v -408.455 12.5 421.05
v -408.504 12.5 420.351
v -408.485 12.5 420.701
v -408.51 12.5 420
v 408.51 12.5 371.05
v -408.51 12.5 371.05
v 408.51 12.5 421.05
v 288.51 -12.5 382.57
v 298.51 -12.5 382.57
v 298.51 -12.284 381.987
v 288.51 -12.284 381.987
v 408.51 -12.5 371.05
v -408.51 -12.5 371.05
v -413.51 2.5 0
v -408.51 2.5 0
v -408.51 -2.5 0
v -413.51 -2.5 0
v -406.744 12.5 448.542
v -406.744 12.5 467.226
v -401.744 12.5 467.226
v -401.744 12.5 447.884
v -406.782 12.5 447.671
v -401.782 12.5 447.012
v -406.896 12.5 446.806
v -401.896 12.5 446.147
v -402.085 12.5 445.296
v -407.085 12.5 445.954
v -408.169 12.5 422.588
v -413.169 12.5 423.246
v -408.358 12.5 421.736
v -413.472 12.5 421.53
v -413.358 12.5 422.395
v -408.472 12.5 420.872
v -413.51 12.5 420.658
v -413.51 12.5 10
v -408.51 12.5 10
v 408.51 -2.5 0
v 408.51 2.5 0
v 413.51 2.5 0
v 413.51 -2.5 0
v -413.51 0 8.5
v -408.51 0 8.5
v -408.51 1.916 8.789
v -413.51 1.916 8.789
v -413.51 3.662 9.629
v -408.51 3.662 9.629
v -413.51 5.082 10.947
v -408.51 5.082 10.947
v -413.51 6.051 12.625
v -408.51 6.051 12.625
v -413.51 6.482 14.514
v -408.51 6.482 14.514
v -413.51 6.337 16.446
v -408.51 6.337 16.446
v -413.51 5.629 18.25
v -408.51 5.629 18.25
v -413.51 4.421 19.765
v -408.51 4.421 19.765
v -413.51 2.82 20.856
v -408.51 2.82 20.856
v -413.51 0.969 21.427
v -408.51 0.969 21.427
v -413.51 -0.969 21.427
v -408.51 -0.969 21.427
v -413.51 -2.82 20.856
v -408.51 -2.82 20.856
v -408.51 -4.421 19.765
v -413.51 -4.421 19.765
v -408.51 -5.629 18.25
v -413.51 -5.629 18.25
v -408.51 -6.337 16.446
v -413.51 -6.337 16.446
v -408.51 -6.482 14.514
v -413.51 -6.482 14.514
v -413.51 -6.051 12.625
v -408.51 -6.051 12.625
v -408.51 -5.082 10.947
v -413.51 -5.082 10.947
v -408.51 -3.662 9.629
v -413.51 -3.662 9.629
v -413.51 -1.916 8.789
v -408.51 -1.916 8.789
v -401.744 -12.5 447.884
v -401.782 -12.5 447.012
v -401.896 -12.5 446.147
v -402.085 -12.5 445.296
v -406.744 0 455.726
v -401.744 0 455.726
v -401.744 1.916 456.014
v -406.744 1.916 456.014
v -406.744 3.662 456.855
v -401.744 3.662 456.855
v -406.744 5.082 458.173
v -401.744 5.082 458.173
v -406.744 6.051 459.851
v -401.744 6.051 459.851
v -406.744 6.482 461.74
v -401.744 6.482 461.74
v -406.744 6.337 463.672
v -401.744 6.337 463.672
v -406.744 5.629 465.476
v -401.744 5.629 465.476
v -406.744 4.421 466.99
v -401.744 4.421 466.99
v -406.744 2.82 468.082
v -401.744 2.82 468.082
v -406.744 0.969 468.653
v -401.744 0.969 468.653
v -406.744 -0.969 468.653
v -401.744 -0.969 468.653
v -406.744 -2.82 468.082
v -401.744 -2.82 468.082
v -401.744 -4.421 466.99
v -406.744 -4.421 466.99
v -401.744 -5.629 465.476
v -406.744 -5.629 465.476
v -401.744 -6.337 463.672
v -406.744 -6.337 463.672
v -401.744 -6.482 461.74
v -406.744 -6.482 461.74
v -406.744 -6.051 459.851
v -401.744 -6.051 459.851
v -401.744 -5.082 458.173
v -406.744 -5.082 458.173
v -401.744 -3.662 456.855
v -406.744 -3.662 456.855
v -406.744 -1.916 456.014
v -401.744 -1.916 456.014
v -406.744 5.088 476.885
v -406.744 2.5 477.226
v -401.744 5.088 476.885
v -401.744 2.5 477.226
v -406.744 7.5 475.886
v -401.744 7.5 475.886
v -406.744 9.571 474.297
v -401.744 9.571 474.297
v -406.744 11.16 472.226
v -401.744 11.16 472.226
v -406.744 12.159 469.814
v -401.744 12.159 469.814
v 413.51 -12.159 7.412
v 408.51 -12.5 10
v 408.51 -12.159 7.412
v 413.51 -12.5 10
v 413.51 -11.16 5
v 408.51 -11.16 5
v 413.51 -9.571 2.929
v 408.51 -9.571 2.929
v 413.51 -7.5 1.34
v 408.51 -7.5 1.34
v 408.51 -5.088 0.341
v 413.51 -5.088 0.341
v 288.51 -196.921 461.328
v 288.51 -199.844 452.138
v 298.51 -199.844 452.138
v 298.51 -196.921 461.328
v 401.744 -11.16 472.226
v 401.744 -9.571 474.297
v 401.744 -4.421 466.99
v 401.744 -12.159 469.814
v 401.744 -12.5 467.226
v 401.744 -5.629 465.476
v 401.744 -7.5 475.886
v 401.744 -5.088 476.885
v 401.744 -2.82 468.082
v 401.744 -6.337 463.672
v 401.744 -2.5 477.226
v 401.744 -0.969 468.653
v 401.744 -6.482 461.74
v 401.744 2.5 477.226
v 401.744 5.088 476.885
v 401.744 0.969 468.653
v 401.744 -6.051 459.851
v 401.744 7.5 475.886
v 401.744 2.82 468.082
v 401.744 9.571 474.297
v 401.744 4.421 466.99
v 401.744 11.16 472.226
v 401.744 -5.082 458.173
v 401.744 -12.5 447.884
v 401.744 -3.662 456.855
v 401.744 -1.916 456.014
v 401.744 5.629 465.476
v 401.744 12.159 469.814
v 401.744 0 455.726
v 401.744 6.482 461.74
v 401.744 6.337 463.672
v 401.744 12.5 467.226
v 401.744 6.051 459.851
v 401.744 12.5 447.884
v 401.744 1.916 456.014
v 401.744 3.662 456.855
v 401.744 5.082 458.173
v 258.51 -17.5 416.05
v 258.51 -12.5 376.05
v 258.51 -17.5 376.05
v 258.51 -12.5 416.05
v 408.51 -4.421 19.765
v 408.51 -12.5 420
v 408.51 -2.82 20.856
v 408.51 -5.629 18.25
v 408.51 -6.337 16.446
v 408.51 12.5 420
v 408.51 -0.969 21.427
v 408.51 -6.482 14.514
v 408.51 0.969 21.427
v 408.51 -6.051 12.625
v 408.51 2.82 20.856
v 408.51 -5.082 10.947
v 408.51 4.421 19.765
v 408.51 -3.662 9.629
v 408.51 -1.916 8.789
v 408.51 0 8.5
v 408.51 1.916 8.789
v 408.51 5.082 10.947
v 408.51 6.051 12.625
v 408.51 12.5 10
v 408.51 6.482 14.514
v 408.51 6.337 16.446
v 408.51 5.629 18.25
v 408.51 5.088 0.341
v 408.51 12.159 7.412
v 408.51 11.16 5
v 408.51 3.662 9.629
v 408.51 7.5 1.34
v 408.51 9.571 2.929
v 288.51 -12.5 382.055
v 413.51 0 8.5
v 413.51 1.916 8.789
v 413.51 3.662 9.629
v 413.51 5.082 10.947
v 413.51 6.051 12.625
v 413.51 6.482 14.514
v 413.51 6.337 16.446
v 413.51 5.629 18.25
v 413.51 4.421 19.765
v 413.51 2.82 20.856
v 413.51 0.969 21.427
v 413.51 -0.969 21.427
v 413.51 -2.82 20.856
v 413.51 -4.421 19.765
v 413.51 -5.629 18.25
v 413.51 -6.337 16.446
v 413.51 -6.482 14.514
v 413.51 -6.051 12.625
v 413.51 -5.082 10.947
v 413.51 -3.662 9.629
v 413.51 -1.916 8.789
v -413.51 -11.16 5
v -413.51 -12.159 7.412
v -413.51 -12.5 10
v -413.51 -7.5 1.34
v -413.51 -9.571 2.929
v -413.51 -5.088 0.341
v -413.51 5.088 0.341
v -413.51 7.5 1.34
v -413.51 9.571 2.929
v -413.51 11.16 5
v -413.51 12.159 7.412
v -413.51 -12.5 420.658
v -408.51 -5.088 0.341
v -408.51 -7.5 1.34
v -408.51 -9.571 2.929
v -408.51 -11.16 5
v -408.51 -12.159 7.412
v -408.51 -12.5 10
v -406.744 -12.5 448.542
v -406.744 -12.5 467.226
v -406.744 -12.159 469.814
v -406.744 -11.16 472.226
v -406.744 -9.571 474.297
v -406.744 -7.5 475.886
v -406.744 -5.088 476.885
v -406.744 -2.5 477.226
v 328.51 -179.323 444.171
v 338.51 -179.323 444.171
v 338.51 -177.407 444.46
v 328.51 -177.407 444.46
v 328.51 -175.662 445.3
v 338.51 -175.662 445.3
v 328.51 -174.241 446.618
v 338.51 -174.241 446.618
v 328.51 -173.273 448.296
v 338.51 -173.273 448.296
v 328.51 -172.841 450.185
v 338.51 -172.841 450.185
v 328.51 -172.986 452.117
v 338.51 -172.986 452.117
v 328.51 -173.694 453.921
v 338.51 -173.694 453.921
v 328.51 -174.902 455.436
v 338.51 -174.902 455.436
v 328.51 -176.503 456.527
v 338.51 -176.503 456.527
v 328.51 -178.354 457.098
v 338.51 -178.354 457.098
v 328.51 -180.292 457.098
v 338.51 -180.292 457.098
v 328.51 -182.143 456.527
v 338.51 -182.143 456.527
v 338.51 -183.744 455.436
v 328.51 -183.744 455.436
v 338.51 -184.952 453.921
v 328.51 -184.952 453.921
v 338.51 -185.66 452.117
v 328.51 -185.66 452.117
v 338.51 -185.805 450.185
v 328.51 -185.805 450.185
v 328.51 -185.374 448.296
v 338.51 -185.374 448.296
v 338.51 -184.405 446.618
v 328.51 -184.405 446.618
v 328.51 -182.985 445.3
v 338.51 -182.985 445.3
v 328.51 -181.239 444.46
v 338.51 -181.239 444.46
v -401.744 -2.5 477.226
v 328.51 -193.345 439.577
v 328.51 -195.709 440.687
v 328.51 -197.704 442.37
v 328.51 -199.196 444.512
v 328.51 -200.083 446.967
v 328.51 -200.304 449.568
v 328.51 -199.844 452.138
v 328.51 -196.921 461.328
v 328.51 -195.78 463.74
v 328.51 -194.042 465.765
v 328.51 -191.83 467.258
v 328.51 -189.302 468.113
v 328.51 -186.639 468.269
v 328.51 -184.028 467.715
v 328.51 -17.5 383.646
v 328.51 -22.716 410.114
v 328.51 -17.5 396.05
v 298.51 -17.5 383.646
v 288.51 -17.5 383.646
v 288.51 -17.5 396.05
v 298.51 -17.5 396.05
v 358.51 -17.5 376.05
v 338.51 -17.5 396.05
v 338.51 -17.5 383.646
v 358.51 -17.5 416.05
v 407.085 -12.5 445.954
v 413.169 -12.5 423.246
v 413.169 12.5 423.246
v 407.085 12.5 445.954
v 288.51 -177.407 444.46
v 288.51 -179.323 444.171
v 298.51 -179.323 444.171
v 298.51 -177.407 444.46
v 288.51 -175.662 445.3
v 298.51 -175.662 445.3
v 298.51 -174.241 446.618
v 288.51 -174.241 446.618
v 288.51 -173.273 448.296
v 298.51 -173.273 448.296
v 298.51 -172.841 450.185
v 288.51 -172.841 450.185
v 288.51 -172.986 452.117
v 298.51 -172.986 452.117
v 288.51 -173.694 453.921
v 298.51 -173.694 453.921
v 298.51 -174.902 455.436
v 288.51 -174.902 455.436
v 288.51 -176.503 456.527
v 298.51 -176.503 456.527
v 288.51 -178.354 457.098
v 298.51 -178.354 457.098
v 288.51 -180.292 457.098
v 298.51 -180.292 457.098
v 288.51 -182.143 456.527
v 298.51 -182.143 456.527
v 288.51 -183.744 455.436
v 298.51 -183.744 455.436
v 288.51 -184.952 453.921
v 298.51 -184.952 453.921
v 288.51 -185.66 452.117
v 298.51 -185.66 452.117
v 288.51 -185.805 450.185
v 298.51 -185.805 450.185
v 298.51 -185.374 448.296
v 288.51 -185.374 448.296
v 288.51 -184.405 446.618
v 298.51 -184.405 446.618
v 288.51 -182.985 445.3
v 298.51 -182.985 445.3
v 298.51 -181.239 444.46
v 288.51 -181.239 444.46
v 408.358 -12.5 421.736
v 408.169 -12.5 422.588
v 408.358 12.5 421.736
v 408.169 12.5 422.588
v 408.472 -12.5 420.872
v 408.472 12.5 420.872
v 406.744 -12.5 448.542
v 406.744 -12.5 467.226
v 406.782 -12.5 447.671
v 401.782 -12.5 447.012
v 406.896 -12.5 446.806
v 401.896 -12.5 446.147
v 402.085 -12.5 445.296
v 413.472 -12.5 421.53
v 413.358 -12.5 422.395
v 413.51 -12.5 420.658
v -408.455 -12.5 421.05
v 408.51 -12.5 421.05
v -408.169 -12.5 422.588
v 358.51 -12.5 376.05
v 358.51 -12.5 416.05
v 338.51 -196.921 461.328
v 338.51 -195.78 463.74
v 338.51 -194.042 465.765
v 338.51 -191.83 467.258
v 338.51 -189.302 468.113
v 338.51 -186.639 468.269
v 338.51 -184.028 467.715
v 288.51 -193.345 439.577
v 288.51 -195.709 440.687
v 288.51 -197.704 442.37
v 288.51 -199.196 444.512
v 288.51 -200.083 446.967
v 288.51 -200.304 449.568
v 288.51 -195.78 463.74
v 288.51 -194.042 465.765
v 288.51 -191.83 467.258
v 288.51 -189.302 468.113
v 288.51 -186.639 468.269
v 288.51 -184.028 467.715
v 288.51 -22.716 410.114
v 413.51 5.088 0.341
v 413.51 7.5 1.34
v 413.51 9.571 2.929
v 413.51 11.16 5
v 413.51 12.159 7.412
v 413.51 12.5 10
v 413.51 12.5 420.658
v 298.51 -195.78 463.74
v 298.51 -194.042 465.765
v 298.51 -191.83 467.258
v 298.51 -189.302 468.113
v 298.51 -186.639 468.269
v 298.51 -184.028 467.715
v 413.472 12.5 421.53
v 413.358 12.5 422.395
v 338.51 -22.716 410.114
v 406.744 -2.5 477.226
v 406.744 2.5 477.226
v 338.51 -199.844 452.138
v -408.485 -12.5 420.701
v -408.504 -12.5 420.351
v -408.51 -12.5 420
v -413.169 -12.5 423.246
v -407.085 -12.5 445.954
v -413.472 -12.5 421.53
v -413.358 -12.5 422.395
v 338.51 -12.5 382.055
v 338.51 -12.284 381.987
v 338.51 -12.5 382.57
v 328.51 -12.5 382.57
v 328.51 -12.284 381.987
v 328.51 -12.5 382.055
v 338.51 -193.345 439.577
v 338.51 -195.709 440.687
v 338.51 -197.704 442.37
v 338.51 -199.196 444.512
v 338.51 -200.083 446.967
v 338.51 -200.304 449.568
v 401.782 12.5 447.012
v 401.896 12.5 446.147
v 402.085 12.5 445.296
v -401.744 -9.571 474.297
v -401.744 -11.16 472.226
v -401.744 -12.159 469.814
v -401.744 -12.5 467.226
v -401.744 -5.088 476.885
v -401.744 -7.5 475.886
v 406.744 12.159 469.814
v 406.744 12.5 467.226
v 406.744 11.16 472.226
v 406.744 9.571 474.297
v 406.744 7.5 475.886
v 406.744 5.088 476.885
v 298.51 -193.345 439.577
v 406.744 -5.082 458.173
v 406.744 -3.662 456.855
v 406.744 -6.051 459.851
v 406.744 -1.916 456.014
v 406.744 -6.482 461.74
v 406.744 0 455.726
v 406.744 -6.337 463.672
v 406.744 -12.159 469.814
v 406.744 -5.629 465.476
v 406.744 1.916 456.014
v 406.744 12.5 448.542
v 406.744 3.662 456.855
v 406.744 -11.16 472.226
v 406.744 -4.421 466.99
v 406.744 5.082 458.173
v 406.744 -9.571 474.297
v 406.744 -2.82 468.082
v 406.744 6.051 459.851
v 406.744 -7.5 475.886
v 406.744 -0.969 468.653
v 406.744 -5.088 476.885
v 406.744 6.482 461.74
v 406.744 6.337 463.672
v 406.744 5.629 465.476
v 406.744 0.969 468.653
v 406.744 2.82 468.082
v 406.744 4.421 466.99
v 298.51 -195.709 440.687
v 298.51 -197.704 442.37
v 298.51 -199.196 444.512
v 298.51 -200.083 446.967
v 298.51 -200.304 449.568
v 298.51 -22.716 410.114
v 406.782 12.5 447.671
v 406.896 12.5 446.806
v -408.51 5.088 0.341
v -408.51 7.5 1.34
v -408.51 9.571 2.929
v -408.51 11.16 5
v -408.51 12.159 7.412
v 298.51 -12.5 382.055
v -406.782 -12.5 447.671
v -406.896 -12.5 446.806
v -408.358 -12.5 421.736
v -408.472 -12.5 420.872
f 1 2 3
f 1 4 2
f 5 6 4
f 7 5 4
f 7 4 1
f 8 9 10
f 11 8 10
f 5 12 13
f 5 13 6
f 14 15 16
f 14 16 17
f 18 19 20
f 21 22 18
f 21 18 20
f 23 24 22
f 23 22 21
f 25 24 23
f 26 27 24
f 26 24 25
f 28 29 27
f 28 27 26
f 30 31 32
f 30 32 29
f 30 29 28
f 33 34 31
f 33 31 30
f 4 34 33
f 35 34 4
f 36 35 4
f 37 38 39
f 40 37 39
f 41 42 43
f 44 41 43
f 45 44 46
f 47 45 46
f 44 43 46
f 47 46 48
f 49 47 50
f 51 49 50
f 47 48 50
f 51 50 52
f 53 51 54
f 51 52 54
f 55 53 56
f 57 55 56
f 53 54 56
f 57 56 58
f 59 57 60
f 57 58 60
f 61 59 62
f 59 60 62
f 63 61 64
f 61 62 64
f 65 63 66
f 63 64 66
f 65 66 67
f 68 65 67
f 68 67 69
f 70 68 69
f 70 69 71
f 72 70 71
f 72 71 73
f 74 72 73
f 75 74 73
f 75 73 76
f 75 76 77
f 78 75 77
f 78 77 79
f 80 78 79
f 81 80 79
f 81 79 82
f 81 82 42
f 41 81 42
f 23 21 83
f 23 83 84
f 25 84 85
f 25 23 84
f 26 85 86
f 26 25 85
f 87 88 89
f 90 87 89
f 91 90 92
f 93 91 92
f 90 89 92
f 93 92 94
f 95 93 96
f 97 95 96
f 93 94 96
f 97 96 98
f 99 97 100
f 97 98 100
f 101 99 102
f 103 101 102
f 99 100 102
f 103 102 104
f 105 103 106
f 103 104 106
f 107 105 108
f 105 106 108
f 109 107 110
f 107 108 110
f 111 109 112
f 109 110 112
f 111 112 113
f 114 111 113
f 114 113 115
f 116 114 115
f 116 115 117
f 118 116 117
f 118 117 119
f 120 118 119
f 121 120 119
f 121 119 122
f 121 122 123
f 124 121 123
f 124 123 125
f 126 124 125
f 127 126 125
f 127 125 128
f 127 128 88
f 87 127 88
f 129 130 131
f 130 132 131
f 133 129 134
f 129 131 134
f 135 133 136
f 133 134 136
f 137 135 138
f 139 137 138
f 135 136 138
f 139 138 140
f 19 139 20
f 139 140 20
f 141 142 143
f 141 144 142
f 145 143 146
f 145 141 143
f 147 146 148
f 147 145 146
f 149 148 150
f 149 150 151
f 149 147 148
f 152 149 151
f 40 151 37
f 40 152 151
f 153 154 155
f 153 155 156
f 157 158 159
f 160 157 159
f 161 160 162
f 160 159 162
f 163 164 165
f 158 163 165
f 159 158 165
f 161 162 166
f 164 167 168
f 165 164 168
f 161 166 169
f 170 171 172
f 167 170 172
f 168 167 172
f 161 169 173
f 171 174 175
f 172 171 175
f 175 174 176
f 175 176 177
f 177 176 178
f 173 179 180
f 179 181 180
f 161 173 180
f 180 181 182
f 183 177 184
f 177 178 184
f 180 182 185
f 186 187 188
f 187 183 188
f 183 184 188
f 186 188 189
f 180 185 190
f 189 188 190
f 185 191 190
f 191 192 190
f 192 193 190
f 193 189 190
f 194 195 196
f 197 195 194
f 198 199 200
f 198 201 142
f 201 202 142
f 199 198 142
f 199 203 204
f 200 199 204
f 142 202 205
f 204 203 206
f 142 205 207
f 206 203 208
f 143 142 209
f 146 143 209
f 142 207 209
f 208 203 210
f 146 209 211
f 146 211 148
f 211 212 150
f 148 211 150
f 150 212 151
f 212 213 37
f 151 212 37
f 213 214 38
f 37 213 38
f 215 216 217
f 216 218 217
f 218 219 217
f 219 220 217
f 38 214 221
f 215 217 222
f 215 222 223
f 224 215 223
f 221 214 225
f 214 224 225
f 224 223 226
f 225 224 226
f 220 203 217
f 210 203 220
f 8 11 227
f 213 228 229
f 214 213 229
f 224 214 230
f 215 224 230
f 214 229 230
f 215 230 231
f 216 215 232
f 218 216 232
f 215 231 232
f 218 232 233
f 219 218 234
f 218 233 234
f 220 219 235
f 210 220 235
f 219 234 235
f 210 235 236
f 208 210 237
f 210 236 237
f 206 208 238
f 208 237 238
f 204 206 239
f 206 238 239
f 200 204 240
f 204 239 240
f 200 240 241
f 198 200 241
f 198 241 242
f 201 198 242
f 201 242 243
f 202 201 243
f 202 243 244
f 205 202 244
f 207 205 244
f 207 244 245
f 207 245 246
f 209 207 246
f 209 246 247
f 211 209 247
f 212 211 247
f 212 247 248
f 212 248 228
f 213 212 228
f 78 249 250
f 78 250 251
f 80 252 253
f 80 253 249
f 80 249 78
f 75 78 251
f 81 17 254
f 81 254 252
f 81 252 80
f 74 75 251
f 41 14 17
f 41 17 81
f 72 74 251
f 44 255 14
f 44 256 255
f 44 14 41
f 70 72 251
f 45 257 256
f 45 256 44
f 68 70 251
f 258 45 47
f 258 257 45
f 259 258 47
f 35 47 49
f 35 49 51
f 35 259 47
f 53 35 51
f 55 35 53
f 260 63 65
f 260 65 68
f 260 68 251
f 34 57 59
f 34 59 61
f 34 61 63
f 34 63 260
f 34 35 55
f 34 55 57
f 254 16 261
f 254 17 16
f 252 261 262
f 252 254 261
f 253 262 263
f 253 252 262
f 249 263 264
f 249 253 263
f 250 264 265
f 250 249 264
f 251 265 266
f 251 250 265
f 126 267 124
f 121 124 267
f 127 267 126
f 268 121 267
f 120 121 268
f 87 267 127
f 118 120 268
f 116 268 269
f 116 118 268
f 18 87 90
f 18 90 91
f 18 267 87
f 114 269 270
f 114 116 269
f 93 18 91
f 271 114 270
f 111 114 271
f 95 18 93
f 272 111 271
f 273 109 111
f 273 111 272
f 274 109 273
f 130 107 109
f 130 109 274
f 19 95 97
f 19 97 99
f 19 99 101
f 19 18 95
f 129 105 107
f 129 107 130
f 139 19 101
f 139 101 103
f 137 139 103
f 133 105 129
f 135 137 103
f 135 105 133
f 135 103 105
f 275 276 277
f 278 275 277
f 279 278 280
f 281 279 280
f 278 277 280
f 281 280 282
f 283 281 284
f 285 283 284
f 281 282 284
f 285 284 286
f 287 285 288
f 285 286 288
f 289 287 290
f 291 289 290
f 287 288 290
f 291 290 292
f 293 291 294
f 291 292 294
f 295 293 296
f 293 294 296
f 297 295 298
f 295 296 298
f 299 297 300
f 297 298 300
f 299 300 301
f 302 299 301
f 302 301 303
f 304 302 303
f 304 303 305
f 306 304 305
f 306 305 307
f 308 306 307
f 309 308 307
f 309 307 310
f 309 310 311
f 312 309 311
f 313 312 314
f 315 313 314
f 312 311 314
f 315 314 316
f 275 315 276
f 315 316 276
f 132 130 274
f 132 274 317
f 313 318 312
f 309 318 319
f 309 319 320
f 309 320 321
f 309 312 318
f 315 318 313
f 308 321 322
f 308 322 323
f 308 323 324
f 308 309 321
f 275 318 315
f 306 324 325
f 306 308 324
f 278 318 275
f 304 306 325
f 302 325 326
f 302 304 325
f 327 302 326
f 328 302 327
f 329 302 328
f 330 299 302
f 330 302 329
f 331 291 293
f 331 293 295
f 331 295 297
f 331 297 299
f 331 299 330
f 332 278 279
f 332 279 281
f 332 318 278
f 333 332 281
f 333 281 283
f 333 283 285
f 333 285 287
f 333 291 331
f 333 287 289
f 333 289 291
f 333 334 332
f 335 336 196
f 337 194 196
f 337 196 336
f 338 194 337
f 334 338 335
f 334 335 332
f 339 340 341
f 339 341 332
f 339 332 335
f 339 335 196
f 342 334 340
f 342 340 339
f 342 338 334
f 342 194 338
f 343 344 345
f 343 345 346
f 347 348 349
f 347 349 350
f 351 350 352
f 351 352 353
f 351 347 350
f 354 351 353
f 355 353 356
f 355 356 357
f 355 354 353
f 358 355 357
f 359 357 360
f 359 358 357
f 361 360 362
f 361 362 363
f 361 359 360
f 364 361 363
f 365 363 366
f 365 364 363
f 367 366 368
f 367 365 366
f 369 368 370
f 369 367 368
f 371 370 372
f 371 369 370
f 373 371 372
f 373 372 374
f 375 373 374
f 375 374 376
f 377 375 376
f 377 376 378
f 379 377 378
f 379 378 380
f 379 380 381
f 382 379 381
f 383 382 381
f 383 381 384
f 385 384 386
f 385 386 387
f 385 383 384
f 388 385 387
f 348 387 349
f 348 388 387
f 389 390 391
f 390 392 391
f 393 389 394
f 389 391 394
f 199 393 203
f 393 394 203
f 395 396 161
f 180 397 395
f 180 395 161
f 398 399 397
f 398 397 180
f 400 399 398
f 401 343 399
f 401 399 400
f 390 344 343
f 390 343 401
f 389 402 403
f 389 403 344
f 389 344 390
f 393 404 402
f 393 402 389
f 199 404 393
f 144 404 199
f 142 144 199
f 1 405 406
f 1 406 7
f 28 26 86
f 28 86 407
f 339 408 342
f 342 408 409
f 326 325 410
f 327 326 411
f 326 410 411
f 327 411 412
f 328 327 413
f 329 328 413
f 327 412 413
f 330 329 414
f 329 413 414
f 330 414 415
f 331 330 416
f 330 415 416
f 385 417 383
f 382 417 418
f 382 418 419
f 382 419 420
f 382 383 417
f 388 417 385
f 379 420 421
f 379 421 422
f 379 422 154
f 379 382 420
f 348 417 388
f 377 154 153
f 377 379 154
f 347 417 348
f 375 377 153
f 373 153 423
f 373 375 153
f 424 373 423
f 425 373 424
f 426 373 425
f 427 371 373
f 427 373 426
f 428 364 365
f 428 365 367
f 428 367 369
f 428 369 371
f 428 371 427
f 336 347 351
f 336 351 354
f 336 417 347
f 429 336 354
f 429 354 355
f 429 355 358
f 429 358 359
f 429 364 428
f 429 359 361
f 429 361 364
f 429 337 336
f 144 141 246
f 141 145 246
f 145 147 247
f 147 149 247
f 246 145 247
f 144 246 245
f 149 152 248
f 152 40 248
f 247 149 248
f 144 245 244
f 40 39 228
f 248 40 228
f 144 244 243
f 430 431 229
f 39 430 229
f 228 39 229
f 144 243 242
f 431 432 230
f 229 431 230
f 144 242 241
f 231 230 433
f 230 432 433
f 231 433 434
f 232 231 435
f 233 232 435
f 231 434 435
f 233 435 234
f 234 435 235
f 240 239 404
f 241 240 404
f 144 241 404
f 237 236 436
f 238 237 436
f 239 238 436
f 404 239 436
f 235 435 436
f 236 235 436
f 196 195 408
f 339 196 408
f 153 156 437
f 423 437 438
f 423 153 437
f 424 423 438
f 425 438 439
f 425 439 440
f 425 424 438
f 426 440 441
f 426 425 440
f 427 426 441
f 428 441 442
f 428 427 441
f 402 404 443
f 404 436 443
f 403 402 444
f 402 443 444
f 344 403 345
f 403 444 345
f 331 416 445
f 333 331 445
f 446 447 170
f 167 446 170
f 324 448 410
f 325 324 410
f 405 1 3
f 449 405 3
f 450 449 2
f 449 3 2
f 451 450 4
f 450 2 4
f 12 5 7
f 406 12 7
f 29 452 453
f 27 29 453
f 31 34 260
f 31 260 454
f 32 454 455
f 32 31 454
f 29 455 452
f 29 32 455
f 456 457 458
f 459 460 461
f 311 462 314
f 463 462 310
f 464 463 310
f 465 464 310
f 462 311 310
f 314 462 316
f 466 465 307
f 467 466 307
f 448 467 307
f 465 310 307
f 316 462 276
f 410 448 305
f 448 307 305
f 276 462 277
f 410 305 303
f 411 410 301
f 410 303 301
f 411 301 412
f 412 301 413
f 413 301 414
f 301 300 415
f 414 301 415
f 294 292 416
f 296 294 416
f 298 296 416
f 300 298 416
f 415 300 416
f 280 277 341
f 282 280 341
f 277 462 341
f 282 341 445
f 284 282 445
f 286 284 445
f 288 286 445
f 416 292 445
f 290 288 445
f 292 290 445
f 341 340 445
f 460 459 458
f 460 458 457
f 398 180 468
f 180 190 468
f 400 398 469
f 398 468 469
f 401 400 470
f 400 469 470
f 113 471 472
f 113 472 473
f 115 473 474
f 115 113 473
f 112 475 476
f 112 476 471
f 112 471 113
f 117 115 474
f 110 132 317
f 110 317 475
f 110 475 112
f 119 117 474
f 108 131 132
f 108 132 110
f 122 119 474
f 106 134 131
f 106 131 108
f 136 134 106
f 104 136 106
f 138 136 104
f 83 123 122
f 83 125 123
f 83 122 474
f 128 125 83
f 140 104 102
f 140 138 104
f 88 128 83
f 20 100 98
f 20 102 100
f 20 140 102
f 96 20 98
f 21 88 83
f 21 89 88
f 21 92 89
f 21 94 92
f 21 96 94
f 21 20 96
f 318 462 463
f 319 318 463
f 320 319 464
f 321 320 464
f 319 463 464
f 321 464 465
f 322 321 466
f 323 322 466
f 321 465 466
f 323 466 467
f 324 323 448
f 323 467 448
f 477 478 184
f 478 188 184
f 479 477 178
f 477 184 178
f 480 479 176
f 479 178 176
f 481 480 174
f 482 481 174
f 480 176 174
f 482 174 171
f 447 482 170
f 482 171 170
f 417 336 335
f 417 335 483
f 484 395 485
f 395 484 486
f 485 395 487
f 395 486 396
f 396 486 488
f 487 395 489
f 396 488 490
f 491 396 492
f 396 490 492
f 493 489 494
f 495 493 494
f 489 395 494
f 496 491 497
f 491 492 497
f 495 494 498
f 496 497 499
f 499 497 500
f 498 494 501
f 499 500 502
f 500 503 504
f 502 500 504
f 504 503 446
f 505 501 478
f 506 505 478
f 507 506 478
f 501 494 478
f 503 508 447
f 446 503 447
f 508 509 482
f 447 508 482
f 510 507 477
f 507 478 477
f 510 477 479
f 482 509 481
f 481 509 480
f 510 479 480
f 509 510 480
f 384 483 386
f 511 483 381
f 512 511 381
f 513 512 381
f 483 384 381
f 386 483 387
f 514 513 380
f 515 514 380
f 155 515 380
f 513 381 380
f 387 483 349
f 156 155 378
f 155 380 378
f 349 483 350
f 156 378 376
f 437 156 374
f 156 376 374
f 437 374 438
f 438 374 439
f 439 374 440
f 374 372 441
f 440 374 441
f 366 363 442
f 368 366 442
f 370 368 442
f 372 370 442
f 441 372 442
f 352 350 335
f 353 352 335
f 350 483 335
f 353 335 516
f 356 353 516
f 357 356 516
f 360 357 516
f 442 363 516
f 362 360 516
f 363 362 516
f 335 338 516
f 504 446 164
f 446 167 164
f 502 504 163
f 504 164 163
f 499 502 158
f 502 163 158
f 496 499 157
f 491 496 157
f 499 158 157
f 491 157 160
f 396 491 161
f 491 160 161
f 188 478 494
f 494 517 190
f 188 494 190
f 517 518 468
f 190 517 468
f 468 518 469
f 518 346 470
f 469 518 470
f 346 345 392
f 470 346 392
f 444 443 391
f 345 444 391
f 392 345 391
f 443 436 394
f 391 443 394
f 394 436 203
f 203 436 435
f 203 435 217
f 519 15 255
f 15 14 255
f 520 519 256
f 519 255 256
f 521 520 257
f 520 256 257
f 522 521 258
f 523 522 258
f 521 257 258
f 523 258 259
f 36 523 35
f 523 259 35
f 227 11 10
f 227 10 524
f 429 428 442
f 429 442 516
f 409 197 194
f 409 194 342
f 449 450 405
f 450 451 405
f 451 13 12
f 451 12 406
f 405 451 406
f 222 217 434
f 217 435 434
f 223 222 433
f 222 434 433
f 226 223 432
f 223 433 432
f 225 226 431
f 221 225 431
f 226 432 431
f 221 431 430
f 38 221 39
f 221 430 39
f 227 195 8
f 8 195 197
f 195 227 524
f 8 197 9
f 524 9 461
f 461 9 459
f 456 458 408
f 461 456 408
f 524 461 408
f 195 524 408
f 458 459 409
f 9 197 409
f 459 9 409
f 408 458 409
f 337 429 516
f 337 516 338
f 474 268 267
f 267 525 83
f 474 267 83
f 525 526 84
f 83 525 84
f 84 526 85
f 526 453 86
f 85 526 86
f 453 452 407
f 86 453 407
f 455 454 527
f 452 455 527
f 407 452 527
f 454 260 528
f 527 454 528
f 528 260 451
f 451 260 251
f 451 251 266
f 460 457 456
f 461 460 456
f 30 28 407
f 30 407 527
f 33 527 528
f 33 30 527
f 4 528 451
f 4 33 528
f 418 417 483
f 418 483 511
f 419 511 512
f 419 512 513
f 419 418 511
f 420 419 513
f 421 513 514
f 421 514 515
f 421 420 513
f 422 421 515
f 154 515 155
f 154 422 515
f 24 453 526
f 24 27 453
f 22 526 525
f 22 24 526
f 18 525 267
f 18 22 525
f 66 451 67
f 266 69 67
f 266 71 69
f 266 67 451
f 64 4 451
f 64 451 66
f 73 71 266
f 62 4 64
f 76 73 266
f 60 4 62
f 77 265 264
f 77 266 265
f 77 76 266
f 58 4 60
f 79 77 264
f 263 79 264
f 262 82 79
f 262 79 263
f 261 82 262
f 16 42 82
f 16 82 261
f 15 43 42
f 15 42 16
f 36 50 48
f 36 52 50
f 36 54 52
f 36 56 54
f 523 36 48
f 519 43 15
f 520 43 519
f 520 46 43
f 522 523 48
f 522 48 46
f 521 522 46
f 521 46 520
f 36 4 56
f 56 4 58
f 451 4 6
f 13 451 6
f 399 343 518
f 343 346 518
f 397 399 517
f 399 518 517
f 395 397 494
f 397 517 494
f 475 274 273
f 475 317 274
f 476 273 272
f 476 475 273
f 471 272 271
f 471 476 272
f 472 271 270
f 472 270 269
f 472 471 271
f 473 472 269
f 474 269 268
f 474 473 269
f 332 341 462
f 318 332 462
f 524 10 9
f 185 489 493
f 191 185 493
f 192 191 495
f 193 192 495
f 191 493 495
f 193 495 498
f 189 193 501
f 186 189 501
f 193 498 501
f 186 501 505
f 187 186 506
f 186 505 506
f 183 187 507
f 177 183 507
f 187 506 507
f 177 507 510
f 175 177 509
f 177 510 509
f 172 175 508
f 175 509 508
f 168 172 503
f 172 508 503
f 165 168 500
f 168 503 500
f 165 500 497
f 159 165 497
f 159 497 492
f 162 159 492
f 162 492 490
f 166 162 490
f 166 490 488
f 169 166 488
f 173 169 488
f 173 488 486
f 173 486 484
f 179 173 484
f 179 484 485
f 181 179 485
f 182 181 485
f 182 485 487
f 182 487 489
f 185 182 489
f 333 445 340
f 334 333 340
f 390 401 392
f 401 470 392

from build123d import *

# Parameters (mm, degrees)
BOSS_EXTRUDE1_DEPTH   = 12.5
BOSS_EXTRUDE1_2_DEPTH = 12.5
FILLET1_R             = 10
FILLET2_R             = 10
SKETCH2_R             = 6.5
CUT_EXTRUDE1_DEPTH    = 869
BOSS_EXTRUDE2_REACH   = 952.588
SKETCH8_W             = 50
SKETCH8_H             = 25
SKETCH9_W             = 100
SKETCH9_H             = 40
BOSS_EXTRUDE3_DEPTH   = 5
SKETCH23_R            = 6.5
BOSS_EXTRUDE4_DEPTH   = 10


with BuildPart() as part:
    # Sketch1 → Boss-Extrude1 (new, symmetric)
    with BuildSketch(Plane(origin=(0, 0, 0), x_dir=(1, 0, 0), z_dir=(0, 1, 0))):
        with BuildLine():
            Line((413.51, 0), (413.51, -420.658262488))
            ThreePointArc((413.51, -420.658262488), (413.424448614, -421.96352441), (413.169258263, -423.246452939))
            Line((413.169258263, -423.246452939), (407.084803077, -445.953948828))
            ThreePointArc((407.084803077, -445.953948828), (406.829612726, -447.236877357), (406.74406134, -448.542139279))
            Line((406.74406134, -448.542139279), (406.74406134, -477.225614303))
            Line((406.74406134, -477.225614303), (401.74406134, -477.225614303))
            Line((401.74406134, -477.225614303), (401.74406134, -447.883876791))
            ThreePointArc((401.74406134, -447.883876791), (401.829612726, -446.578614869), (402.084803077, -445.29568634))
            Line((402.084803077, -445.29568634), (408.169258263, -422.588190451))
            ThreePointArc((408.169258263, -422.588190451), (408.424448614, -421.305261922), (408.51, -420))
            Line((408.51, -420), (408.51, 0))
            Line((408.51, 0), (413.51, 0))
        make_face()
    extrude(amount=BOSS_EXTRUDE1_DEPTH, both=True)

    # Fillet2
    fillet2_edges = [part.edges().sort_by_distance(p)[0] for p in [
        (404.24406134, -12.5, 477.225614303),
        (411.01, -12.5, 0),
        (404.24406134, 12.5, 477.225614303),
        (411.01, 12.5, 0),
    ]]
    fillet(fillet2_edges, radius=FILLET2_R)


with BuildPart() as body_2:
    # Sketch1 → Boss-Extrude1 2 (new, symmetric)
    with BuildSketch(Plane(origin=(0, 0, 0), x_dir=(1, 0, 0), z_dir=(0, 1, 0))):
        with BuildLine():
            Line((-406.74406134, -477.225614303), (-401.74406134, -477.225614303))
            Line((-401.74406134, -477.225614303), (-401.74406134, -447.883876791))
            ThreePointArc((-401.74406134, -447.883876791), (-401.829612726, -446.578614869), (-402.084803077, -445.29568634))
            Line((-402.084803077, -445.29568634), (-408.169258263, -422.588190451))
            ThreePointArc((-408.169258263, -422.588190451), (-408.424448614, -421.305261922), (-408.51, -420))
            Line((-408.51, -420), (-408.51, 0))
            Line((-408.51, 0), (-413.51, 0))
            Line((-413.51, 0), (-413.51, -420.658262488))
            ThreePointArc((-413.51, -420.658262488), (-413.424448614, -421.96352441), (-413.169258263, -423.246452939))
            Line((-413.169258263, -423.246452939), (-407.084803077, -445.953948828))
            ThreePointArc((-407.084803077, -445.953948828), (-406.829612726, -447.236877357), (-406.74406134, -448.542139279))
            Line((-406.74406134, -448.542139279), (-406.74406134, -477.225614303))
        make_face()
    extrude(amount=BOSS_EXTRUDE1_2_DEPTH, both=True)

    # Fillet1
    fillet1_edges = [body_2.edges().sort_by_distance(p)[0] for p in [
        (-411.01, -12.5, 0),
        (-404.24406134, -12.5, 477.225614303),
        (-404.24406134, 12.5, 477.225614303),
        (-411.01, 12.5, 0),
    ]]
    fillet(fillet1_edges, radius=FILLET1_R)


with BuildPart() as cut_extrude1_tool:
    # Sketch2 → Cut-Extrude1 (new body)
    with BuildSketch(Plane(origin=(413.51, 0, 0), x_dir=(0, 0, -1), z_dir=(1, 0, 0))):
        with Locations((-462.225614303, 0)):
            Circle(SKETCH2_R)
        with Locations((-15, 0)):
            Circle(SKETCH2_R)
    extrude(amount=-CUT_EXTRUDE1_DEPTH)


with BuildPart() as part_1:
    add(part.part)

    # Cut-Extrude1: cut by cut_extrude1_tool
    add(cut_extrude1_tool.part, mode=Mode.SUBTRACT)


with BuildPart() as body_2_1:
    add(body_2.part)

    # Cut-Extrude1: cut by cut_extrude1_tool
    add(cut_extrude1_tool.part, mode=Mode.SUBTRACT)


with BuildPart() as body_3:

    # Sketch8 → Boss-Extrude2 (new, up to next)
    with BuildSketch(Plane.ZY.offset(-408.51), mode=Mode.PRIVATE) as boss_extrude2_sk1:
        with Locations((396.050441787, 0)):
            Rectangle(SKETCH8_W, SKETCH8_H)
    boss_extrude2_tool1 = extrude(boss_extrude2_sk1.sketch, amount=BOSS_EXTRUDE2_REACH, mode=Mode.PRIVATE) - body_2_1.part
    add(boss_extrude2_tool1.solids().sort_by_distance((408.51, 0, 396.050442))[0])


with BuildPart() as body_4:
    # Sketch9 → Boss-Extrude3 (new body)
    with BuildSketch(Plane.XZ.offset(12.5)):
        with Locations((308.51, 396.050441787)):
            Rectangle(SKETCH9_W, SKETCH9_H)
    extrude(amount=BOSS_EXTRUDE3_DEPTH)

    # Sketch23 → Boss-Extrude4 (add)
    with BuildSketch(Plane(origin=(338.51, 0, 0), x_dir=(0, 0, -1), z_dir=(1, 0, 0))):
        with BuildLine():
            Line((-410.114254625, -22.716240837), (-381.986628949, -12.283759163))
            Line((-381.986628949, -12.283759163), (-439.577352288, -193.345374602))
            ThreePointArc((-439.577352288, -193.345374602), (-444.511800202, -199.196004274), (-452.138001698, -199.843842607))
            Line((-452.138001698, -199.843842607), (-461.32796509, -196.920767841))
            ThreePointArc((-461.32796509, -196.920767841), (-467.257664146, -191.830155733), (-467.714501489, -184.028427581))
            Line((-467.714501489, -184.028427581), (-410.114254625, -22.716240837))
        make_face()
        with Locations((-450.67080199, -179.32318781)):
            Circle(SKETCH23_R, mode=Mode.SUBTRACT)
    boss_extrude4 = extrude(amount=-BOSS_EXTRUDE4_DEPTH)

    # Mirror1: Boss-Extrude4 across plane
    add(boss_extrude4.mirror(Plane(origin=(313.51, 0, 0), x_dir=(0, 0, 1), z_dir=(1, 0, 0))))


solid = Compound([part_1.part, body_2_1.part, body_3.part, body_4.part])
